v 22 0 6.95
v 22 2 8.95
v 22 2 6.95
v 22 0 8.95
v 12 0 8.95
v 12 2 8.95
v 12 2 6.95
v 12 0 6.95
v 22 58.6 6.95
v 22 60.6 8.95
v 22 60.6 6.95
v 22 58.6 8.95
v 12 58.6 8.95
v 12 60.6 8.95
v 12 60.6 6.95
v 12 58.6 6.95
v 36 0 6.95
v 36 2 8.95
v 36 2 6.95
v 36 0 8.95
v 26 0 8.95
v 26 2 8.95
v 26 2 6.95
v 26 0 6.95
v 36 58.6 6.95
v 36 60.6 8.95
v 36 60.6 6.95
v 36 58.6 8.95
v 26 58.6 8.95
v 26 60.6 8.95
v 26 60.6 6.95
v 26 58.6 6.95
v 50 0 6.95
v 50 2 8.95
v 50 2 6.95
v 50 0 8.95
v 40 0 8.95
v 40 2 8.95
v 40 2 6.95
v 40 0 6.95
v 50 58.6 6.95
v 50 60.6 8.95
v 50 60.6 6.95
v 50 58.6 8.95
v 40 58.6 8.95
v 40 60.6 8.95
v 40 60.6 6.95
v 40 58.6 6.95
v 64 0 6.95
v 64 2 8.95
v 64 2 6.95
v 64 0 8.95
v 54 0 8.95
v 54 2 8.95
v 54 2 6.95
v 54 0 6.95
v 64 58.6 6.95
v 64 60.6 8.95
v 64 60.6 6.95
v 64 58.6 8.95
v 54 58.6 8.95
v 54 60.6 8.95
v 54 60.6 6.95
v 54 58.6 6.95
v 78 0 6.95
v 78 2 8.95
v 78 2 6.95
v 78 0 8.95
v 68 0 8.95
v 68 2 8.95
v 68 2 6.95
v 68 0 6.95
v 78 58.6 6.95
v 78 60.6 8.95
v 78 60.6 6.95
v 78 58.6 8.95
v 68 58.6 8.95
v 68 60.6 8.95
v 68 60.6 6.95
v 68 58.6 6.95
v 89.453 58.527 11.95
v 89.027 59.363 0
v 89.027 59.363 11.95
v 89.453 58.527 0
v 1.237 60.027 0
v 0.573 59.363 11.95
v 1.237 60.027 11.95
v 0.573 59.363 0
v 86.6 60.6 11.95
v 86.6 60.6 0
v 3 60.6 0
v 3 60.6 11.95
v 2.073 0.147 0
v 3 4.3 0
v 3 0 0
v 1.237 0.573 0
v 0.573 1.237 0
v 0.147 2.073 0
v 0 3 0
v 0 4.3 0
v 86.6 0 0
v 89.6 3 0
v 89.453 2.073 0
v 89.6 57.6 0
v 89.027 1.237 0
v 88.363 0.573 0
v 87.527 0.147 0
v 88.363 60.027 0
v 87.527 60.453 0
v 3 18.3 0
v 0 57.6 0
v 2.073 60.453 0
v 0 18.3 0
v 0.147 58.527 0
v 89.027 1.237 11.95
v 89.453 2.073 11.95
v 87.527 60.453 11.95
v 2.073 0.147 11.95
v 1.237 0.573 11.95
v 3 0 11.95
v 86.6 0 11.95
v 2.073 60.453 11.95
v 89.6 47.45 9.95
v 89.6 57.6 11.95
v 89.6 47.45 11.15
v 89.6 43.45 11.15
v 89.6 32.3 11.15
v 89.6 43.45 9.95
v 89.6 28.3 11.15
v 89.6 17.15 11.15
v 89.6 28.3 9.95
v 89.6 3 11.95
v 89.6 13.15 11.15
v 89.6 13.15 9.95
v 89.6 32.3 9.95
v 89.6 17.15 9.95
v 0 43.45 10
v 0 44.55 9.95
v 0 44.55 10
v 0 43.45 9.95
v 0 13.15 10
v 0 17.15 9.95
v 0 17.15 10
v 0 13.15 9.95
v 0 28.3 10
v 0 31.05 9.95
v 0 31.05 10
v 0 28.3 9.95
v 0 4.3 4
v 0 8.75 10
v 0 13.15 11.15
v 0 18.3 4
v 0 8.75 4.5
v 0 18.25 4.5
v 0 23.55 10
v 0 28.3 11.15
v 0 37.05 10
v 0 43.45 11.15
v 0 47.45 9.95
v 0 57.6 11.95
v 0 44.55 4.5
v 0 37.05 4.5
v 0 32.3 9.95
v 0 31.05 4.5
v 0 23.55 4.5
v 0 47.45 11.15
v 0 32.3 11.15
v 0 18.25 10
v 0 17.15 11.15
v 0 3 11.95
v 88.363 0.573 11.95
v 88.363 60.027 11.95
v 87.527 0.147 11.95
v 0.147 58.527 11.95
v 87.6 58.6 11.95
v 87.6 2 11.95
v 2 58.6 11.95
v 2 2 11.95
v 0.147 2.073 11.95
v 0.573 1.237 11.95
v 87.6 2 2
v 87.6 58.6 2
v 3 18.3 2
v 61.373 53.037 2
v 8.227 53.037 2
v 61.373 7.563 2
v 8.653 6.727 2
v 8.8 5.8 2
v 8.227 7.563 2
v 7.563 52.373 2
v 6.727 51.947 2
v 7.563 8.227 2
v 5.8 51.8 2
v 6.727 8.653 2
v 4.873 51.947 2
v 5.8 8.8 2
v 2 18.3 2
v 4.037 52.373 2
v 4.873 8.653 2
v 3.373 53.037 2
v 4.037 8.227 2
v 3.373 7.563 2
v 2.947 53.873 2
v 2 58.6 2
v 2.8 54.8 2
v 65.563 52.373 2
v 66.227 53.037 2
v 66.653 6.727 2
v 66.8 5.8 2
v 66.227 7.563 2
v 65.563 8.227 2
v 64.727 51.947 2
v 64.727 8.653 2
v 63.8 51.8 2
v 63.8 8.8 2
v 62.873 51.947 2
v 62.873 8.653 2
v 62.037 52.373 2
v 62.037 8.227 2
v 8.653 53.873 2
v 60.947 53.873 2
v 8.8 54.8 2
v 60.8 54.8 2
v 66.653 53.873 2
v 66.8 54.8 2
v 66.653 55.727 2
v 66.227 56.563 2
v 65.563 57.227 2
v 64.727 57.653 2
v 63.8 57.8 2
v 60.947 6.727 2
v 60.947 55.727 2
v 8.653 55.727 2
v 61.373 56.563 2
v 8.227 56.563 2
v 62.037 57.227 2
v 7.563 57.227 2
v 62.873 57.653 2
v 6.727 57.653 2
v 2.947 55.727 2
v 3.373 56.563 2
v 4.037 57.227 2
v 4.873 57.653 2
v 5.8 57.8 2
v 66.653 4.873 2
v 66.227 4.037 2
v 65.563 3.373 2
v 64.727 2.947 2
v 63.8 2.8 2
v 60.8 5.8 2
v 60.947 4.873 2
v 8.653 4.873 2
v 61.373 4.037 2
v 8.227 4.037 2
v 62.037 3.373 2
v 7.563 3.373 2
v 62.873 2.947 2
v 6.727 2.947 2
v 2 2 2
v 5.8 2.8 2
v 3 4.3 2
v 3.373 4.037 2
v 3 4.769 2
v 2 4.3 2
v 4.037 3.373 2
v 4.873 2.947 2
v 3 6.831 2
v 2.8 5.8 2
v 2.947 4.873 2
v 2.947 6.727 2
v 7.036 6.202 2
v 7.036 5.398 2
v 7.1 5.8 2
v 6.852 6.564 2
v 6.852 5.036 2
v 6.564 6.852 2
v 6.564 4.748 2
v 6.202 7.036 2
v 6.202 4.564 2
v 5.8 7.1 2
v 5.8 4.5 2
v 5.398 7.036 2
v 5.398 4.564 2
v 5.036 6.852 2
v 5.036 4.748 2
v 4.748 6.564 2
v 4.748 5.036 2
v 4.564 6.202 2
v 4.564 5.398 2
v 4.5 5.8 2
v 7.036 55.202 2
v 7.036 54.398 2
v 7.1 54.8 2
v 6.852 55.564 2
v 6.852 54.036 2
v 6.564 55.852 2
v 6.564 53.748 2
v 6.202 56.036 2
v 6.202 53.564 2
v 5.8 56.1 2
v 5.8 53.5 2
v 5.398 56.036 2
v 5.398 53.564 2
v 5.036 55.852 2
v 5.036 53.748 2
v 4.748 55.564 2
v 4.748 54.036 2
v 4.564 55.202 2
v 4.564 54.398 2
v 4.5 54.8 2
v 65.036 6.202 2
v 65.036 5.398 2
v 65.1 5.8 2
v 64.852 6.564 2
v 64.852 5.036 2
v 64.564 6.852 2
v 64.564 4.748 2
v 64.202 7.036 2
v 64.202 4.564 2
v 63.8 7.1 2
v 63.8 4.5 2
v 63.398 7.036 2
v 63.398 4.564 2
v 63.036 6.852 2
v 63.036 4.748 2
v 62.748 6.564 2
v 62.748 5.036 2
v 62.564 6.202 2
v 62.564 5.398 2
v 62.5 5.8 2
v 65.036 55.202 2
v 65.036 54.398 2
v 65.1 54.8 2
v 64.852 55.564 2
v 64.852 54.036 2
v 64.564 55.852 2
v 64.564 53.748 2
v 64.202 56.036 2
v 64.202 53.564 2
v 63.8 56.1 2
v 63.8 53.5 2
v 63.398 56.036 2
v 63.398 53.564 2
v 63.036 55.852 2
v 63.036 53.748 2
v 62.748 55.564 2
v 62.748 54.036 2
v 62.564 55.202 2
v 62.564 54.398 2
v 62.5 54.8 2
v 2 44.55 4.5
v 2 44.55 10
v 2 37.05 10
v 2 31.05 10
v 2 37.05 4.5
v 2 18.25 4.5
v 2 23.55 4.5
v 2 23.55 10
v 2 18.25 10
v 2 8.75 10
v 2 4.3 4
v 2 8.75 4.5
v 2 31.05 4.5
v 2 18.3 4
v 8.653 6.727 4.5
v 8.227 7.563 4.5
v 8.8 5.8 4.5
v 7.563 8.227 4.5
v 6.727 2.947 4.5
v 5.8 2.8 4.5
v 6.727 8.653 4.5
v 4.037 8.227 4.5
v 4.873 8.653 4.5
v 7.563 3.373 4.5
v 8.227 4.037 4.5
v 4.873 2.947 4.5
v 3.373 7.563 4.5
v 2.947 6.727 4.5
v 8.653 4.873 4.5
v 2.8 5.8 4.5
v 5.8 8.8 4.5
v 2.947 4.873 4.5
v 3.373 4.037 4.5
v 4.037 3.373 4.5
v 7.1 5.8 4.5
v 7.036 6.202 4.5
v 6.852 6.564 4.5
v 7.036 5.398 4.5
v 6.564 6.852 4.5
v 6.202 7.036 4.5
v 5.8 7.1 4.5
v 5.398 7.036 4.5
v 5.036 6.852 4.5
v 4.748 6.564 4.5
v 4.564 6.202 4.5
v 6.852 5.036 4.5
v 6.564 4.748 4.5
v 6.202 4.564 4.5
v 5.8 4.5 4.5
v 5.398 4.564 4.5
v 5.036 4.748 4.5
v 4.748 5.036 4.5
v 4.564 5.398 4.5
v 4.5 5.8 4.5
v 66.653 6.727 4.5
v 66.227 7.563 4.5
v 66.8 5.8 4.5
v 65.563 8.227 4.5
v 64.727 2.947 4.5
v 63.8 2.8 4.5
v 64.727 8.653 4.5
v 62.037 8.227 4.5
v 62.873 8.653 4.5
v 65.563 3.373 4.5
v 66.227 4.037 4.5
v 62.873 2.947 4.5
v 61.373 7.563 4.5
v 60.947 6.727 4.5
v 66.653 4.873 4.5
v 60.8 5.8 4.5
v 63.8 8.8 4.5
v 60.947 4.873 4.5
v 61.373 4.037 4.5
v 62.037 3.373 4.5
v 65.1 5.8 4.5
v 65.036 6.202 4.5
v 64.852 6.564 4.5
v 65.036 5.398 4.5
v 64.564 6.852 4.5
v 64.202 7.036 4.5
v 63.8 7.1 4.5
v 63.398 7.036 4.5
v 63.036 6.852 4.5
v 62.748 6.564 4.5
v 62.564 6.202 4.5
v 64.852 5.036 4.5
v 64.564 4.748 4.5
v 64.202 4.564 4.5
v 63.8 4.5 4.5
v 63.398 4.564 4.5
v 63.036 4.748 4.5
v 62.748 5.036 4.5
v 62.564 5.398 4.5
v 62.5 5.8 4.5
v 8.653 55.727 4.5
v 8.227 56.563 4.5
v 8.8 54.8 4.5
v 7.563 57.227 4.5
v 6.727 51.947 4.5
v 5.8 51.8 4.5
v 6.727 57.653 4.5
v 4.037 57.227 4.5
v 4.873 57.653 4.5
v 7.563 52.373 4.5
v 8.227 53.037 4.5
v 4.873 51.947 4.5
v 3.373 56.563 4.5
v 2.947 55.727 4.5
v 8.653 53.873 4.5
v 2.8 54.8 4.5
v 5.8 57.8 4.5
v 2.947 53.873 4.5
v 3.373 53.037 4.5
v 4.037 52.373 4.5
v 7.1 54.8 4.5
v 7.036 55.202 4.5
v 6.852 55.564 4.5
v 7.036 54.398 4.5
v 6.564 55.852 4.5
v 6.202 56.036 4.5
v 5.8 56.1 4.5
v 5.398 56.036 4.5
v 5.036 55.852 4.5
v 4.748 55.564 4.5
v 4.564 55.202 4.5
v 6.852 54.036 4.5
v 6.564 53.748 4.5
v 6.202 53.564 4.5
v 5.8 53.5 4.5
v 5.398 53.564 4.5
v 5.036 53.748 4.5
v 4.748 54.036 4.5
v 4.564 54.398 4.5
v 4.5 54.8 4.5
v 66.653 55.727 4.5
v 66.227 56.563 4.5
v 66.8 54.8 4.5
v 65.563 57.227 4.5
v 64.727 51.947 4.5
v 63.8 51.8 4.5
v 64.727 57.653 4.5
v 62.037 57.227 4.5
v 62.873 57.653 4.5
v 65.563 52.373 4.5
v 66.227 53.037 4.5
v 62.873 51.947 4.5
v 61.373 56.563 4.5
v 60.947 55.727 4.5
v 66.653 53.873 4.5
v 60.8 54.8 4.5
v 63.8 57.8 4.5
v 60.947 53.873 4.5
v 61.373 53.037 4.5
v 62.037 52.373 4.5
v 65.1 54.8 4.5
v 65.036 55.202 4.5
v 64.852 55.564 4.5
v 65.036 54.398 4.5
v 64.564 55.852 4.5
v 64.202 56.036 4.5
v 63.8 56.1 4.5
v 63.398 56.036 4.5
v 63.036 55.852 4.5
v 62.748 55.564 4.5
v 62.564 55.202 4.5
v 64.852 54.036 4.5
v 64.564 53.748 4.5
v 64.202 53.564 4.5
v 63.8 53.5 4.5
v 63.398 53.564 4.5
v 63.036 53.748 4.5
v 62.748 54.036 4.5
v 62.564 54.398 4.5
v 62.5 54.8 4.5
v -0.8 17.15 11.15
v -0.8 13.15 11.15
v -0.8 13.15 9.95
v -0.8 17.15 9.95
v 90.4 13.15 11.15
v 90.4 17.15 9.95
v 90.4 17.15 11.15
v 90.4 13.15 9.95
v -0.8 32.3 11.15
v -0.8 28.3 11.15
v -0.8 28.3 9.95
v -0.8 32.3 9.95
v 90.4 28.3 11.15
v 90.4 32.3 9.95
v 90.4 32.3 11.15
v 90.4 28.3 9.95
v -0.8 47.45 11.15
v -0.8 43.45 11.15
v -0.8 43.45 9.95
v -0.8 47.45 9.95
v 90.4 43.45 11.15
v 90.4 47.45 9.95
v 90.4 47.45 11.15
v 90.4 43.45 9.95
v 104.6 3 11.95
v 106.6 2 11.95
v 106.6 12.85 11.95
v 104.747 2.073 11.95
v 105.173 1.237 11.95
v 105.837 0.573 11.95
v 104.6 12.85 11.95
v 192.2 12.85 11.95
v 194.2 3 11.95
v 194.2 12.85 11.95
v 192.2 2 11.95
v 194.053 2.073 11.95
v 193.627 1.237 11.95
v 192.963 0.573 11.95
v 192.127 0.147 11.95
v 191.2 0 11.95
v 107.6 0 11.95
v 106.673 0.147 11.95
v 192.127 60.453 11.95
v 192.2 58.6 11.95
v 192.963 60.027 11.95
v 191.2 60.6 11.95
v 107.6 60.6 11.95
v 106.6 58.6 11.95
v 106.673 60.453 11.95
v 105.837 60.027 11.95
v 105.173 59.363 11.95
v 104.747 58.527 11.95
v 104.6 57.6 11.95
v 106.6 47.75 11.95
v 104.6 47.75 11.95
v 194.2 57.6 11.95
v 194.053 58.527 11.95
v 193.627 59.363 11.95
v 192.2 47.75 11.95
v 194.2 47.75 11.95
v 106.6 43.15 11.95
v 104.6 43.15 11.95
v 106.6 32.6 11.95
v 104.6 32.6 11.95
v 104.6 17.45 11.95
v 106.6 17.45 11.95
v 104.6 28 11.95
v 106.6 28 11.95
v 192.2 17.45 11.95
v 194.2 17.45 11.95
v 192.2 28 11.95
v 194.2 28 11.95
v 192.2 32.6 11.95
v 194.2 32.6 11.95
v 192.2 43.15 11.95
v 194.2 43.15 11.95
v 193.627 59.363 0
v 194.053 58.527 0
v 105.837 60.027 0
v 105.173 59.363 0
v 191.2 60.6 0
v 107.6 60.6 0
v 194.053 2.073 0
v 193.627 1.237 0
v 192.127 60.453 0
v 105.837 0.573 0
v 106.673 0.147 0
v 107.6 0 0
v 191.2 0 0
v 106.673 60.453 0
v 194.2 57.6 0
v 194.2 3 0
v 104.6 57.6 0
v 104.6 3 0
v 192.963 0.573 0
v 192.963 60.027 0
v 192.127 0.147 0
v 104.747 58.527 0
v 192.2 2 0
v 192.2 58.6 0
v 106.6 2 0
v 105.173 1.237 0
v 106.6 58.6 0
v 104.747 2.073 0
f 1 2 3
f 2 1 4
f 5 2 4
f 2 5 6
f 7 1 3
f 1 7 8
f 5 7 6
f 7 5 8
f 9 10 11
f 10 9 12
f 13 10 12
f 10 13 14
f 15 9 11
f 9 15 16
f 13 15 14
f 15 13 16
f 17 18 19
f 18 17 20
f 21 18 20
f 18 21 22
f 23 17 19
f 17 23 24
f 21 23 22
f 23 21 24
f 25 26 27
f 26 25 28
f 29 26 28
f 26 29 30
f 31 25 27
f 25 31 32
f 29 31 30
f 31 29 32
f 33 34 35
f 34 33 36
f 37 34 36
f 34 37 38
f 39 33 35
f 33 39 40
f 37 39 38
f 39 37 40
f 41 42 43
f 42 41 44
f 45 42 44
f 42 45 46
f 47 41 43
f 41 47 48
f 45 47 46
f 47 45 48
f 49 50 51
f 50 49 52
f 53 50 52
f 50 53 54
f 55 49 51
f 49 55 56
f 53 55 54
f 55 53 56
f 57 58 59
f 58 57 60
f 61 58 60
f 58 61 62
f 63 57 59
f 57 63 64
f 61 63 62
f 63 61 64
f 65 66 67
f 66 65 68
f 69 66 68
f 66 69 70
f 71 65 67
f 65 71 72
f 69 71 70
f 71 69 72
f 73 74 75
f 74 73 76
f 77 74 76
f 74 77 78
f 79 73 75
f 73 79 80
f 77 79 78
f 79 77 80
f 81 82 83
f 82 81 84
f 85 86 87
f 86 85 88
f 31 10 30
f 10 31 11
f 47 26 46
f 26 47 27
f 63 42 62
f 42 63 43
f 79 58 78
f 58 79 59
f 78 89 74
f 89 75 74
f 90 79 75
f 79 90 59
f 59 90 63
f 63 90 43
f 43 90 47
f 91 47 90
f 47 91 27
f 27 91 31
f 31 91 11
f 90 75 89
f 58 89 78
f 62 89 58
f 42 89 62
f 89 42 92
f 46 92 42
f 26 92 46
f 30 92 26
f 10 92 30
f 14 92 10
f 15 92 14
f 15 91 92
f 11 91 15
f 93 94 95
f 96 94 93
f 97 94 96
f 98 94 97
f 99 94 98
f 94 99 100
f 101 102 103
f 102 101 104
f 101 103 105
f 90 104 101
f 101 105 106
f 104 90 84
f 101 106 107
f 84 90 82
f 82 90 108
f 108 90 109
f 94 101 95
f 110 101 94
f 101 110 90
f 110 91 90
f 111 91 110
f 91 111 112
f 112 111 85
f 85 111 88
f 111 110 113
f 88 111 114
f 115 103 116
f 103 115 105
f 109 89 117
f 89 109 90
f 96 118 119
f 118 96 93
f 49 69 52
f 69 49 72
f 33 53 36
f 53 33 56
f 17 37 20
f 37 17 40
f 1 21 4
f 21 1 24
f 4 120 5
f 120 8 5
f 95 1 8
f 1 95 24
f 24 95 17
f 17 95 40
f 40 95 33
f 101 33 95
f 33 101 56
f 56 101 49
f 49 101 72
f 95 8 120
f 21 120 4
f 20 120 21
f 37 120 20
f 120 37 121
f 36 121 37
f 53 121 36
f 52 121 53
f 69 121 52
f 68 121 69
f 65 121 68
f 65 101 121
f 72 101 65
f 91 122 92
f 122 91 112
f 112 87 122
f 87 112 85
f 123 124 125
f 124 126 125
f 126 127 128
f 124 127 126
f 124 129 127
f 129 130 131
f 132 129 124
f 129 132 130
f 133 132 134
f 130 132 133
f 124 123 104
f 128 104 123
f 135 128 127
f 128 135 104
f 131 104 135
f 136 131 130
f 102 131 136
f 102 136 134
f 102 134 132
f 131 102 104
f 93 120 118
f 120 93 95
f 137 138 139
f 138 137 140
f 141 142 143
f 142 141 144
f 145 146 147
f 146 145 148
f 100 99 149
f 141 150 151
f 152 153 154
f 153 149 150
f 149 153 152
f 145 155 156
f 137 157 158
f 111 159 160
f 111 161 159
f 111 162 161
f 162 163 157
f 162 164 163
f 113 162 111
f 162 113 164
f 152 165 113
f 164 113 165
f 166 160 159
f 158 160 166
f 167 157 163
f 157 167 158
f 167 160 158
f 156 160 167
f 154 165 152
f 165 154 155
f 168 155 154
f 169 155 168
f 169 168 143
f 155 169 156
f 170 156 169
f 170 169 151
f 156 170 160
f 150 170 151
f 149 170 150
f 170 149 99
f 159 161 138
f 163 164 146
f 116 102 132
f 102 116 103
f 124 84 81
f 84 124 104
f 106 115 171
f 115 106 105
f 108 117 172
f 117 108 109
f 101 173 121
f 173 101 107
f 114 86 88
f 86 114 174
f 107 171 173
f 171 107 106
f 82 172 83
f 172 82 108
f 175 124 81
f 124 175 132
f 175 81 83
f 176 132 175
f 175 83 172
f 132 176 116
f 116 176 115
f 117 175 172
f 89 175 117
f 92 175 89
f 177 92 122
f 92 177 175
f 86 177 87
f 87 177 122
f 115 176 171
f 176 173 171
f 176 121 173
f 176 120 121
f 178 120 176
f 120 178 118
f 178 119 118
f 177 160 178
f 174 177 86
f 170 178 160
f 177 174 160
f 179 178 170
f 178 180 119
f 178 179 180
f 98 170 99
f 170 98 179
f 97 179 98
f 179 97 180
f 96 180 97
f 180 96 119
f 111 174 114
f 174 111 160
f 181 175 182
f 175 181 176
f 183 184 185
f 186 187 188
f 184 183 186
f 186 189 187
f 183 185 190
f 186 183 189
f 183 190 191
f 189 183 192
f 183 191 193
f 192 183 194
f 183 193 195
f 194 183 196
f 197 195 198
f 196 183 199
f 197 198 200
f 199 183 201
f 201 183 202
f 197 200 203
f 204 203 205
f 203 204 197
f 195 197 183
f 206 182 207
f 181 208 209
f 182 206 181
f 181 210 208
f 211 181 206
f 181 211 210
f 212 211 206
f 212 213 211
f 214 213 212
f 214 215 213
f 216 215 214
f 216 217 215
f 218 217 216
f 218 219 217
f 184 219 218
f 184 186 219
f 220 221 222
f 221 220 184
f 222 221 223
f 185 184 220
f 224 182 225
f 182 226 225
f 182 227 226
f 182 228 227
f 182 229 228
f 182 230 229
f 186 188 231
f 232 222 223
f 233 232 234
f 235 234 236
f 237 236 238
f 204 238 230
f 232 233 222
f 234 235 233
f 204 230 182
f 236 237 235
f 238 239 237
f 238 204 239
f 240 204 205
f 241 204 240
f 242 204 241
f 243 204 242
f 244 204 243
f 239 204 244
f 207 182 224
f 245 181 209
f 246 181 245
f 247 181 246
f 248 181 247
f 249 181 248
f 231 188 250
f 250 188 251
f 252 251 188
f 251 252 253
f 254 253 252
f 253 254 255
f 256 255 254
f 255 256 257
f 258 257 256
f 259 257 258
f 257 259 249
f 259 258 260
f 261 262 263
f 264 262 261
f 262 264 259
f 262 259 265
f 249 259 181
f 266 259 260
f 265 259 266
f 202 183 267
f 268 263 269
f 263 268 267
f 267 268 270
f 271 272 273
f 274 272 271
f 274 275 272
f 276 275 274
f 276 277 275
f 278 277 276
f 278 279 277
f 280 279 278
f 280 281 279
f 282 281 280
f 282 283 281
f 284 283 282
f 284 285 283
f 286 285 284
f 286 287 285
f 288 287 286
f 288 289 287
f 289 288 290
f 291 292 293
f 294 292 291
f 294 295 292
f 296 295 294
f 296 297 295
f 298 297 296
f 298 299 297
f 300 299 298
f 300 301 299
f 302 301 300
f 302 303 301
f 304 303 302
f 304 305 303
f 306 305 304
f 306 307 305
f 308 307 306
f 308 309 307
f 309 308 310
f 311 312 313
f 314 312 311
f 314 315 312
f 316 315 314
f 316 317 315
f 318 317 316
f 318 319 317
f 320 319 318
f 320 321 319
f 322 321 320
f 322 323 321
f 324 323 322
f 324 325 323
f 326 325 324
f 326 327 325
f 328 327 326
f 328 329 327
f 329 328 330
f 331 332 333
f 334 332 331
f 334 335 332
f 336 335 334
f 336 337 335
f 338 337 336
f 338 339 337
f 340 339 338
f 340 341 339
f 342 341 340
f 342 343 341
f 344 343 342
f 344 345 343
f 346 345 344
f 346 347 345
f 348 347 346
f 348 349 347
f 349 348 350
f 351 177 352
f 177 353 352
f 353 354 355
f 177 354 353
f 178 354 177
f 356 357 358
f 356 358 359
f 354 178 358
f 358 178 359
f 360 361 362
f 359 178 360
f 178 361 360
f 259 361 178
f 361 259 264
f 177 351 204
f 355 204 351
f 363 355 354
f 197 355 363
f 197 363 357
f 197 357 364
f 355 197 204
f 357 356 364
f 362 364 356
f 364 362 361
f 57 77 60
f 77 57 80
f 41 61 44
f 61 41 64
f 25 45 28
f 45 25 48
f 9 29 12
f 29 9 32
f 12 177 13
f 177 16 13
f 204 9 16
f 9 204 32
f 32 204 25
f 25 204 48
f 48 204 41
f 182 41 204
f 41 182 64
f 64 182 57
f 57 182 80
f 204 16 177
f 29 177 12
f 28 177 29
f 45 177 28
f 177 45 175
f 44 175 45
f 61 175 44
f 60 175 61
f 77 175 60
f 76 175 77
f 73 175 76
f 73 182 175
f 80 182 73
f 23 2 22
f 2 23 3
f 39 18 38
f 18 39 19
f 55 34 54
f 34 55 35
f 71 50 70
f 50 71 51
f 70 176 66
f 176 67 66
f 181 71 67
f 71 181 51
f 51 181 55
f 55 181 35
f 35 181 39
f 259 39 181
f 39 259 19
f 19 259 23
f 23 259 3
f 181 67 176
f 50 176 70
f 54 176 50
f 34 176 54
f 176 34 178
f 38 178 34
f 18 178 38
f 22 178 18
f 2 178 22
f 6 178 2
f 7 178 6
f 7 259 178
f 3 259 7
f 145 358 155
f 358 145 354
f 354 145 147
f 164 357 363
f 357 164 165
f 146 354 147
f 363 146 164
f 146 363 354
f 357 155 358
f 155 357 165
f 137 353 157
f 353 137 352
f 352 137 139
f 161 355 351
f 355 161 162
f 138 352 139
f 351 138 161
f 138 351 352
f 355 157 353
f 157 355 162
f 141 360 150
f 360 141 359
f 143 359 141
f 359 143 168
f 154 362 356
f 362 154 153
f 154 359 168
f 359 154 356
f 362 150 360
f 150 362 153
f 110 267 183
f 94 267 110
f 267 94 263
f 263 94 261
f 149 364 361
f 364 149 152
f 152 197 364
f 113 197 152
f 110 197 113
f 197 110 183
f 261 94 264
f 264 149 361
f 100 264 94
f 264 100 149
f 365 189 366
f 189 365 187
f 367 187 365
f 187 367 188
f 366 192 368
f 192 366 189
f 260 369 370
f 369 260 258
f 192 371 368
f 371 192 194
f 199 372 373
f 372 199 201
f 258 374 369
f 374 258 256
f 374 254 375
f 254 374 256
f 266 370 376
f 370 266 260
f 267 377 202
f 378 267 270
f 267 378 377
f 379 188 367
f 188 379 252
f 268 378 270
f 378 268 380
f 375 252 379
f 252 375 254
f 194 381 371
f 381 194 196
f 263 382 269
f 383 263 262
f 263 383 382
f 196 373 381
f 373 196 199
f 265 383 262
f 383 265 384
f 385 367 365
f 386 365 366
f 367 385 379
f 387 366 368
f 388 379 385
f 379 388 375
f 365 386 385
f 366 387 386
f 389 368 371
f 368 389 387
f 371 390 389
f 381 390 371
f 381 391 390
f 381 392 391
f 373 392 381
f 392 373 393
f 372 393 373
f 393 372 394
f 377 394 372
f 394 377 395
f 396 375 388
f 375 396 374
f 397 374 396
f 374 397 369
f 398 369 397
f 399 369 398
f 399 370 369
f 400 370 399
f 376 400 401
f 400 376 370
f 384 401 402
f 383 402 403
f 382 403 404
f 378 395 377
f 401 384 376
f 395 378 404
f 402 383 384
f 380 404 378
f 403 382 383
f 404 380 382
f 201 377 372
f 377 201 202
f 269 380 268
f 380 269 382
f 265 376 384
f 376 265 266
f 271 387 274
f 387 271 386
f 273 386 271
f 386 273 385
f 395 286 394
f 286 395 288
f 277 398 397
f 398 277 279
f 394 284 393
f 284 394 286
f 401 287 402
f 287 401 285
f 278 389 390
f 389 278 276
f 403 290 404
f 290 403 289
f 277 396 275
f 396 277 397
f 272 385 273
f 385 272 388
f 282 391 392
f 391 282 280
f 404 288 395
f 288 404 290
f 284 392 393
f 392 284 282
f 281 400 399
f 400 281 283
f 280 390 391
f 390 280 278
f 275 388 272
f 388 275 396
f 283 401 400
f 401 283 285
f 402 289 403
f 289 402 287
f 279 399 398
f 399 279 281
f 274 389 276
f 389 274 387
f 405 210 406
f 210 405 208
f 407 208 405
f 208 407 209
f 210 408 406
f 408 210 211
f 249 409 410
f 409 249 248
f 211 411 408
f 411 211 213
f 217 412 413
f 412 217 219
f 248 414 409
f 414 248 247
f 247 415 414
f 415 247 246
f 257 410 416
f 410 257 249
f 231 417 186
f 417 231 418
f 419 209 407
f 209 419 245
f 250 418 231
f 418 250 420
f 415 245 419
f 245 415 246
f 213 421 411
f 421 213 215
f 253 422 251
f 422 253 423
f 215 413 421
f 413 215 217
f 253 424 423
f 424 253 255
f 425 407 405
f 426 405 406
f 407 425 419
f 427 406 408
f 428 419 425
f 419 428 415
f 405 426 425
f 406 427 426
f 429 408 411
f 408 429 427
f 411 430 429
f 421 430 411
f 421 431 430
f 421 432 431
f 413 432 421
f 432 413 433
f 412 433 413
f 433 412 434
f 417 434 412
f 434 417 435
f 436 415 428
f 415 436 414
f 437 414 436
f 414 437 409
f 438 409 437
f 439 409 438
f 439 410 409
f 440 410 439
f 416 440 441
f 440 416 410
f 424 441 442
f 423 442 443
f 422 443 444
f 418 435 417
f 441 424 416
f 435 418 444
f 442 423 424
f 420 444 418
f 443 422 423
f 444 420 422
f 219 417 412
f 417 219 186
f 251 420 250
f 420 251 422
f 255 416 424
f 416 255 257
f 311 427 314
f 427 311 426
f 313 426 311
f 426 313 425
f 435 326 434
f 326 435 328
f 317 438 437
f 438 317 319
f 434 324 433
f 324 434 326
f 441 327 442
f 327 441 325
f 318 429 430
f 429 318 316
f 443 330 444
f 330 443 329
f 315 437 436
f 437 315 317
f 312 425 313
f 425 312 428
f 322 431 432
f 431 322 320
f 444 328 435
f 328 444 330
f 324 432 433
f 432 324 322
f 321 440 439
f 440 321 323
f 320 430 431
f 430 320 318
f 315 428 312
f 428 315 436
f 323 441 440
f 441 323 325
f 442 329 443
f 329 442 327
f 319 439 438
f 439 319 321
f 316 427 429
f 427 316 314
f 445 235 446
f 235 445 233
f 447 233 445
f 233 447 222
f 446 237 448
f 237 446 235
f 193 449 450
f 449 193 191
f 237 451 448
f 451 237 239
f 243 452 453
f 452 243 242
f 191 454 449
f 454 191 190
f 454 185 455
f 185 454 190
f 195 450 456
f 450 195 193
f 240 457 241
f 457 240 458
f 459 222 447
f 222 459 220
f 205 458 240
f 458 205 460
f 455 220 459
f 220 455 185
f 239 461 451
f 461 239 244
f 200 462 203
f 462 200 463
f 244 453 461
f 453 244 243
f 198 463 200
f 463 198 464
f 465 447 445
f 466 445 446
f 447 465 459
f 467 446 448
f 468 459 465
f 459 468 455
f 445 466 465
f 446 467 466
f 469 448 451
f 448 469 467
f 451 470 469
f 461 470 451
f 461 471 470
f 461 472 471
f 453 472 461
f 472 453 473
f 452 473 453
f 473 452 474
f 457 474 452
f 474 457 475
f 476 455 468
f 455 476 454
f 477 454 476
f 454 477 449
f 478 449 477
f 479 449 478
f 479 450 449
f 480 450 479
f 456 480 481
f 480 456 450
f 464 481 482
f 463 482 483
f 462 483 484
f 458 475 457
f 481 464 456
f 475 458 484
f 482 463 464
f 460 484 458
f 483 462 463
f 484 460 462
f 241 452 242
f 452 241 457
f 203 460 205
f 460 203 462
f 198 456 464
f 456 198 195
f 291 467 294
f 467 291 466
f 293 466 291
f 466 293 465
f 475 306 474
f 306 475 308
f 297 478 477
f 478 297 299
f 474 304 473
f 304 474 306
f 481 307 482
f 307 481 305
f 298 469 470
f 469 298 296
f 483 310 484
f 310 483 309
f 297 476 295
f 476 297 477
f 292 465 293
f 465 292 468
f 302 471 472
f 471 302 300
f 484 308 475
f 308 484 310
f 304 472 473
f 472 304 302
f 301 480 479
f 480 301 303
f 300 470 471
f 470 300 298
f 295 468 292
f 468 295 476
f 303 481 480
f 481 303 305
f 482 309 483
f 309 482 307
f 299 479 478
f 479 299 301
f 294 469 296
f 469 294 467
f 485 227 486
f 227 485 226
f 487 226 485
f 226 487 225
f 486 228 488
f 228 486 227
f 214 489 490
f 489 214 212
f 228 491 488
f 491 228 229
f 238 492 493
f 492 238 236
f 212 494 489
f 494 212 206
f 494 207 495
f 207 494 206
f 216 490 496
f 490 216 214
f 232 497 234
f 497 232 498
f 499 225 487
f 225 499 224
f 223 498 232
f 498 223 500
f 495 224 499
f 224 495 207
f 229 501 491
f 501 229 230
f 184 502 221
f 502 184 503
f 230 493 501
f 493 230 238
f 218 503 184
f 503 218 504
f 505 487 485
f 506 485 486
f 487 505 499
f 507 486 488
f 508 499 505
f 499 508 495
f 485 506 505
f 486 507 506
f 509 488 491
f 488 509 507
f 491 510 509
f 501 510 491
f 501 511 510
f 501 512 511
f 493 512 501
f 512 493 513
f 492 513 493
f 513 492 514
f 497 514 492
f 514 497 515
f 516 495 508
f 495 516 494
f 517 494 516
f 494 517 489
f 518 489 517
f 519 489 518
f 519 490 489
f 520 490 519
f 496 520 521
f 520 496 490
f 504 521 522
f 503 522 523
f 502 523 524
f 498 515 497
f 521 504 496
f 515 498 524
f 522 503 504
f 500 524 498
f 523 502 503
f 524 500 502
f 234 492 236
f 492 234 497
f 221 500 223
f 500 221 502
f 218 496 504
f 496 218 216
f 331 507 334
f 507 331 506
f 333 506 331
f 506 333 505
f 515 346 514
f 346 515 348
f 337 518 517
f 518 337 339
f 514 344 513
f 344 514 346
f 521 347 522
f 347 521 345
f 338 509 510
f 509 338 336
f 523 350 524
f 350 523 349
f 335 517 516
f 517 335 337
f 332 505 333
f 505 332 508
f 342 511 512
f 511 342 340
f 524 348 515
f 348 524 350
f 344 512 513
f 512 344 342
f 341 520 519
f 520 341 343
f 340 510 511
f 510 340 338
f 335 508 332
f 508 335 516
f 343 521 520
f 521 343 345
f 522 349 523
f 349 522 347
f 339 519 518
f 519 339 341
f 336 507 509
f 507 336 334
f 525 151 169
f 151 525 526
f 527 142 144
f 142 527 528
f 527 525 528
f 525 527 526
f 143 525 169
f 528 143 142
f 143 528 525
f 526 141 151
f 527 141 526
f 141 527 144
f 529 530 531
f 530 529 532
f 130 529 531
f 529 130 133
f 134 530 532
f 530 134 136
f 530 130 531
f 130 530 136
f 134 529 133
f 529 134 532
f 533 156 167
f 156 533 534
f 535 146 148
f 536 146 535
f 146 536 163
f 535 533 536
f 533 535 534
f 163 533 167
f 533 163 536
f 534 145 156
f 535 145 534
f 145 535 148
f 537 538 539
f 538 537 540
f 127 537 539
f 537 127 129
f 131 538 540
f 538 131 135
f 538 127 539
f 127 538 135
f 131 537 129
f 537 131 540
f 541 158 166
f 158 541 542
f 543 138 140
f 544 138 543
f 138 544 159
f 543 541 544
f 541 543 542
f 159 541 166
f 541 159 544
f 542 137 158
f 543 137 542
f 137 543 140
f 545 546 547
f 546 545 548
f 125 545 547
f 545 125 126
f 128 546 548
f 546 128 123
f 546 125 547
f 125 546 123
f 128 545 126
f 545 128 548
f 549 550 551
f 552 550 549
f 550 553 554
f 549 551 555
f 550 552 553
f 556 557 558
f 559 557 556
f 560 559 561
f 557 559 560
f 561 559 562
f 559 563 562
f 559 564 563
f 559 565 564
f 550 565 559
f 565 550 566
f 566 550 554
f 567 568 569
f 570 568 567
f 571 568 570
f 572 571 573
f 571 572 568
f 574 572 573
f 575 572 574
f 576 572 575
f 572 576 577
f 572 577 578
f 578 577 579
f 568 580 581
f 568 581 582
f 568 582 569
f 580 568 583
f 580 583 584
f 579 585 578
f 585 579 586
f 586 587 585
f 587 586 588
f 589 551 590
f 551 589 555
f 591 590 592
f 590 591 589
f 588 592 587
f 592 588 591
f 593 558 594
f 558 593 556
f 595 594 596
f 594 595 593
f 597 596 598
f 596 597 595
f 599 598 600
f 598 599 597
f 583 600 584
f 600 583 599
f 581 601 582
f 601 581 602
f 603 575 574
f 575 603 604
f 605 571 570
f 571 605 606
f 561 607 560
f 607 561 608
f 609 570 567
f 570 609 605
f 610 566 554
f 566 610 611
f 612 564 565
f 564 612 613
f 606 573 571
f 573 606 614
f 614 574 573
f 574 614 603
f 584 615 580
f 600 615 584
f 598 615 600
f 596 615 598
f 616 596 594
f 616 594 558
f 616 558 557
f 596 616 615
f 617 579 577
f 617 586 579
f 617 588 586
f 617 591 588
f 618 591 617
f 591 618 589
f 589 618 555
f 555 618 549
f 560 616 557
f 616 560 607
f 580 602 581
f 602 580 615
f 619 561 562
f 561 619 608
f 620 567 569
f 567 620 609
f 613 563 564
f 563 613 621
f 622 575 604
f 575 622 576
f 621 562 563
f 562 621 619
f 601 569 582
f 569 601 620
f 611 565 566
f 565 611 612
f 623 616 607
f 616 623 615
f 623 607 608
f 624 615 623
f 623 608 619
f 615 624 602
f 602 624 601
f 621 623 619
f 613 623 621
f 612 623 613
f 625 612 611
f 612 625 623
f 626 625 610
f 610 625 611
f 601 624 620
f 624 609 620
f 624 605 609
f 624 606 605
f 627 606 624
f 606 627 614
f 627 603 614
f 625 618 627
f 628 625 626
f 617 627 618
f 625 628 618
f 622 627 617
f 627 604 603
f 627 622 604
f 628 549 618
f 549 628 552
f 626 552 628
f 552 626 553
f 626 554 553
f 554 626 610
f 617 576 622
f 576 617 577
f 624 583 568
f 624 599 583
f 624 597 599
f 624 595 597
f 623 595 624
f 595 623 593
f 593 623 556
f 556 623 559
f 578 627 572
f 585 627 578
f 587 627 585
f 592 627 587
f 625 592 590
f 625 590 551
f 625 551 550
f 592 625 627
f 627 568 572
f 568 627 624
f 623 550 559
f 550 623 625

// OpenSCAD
// Wireless Display Dongle — 4K-kotelo (Pi 4 Model B)
// Mitat perustuvat Raspberry Pi 4 Model B:n virallisiin mittoihin
//
// Tulosta: PETG (lämmönkesto), 0.2mm layer height
// Kotelo on kaksiosainen: pohja + kansi snap-fit-lukituksella

/* [Asetukset] */
wall = 2.0;       // seinämän paksuus - paksumpi kuin lite (lämpö)
tol = 0.3;        // toleranssi

/* [Pi 4 Model B mitat] */
pcb_w = 85.0;     // leveys
pcb_d = 56.0;     // syvyys
pcb_h = 1.4;      // piirilevyn paksuus
comp_h = 5.0;     // komponenttien korkeus yläpuolella
bottom_h = 2.5;   // komponenttien korkeus alapuolella (SD-kortin lukija)

/* [Liittimet - Pi 4:n vasemmasta reunasta mitattuna] */
// Micro-HDMI 0: vasen pääty (USB-C:n puoli)
hdmi0_offset = 25.0;
hdmi0_w = 7.5;
hdmi0_h = 3.5;

// Micro-HDMI 1:
hdmi1_offset = 38.5;
hdmi1_w = 7.5;
hdmi1_h = 3.5;

// USB-C (virta): vasen pääty
usbc_offset = 11.2;
usbc_w = 9.5;
usbc_h = 3.5;

// USB-A portit: oikea pääty (ei aukkoa - ei tarvita)

// Ethernet: oikea pääty (ei aukkoa - ei tarvita)

// microSD: vasen pääty, piirilevyn alapuolella
sd_offset = 2.0;   // reunasta
sd_w = 14.0;
sd_h = 2.0;

// GPIO: pitkä sivu, yläpuoli (ei aukkoa)

/* [Jäähdytys] */
// Pi 4 tarvitsee tehokkaampaa jäähdytystä
heatsink_h = 5.0;
fan_diameter = 25.0;  // valinnainen 25mm tuuletin

/* [Lasketut mitat] */
inner_w = pcb_w + tol * 2;
inner_d = pcb_d + tol * 2;
inner_h = bottom_h + pcb_h + comp_h + heatsink_h + 2.0;

outer_w = inner_w + wall * 2;
outer_d = inner_d + wall * 2;
outer_h = inner_h + wall * 2;

snap_w = 4.0;
snap_h = 1.2;
snap_depth = 0.8;

module case_bottom() {
    difference() {
        rounded_box(outer_w, outer_d, outer_h / 2 + wall, 3);

        // Sisätila
        translate([wall, wall, wall])
            cube([inner_w, inner_d, outer_h]);

        // Micro-HDMI 0 -aukko
        translate([-1, wall + tol + hdmi0_offset - hdmi0_w/2, wall + bottom_h])
            cube([wall + 2, hdmi0_w, hdmi0_h + 2]);

        // Micro-HDMI 1 -aukko
        translate([-1, wall + tol + hdmi1_offset - hdmi1_w/2, wall + bottom_h])
            cube([wall + 2, hdmi1_w, hdmi1_h + 2]);

        // USB-C virta-aukko
        translate([-1, wall + tol + usbc_offset - usbc_w/2, wall + bottom_h])
            cube([wall + 2, usbc_w, usbc_h + 2]);

        // microSD-aukko (alapuoli, vasen pääty)
        translate([-1, wall + tol + sd_offset, -1])
            cube([wall + 2, sd_w, wall + sd_h + 1]);

        // Sivujen tuuletusaukot
        for (i = [0:4]) {
            translate([wall + 10 + i * 14, -1, outer_h / 2 - 3])
                cube([10, wall + 2, 2]);
            translate([wall + 10 + i * 14, outer_d - wall - 1, outer_h / 2 - 3])
                cube([10, wall + 2, 2]);
        }
    }

    // Piirilevyn tuet (Pi 4:n kiinnitysreiät)
    // Reiät: 3.5mm reunasta, 58mm ja 49mm välit
    hole_positions = [
        [3.5, 3.5],
        [3.5 + 58, 3.5],
        [3.5, 3.5 + 49],
        [3.5 + 58, 3.5 + 49]
    ];
    for (pos = hole_positions)
        translate([wall + tol + pos[0], wall + tol + pos[1], wall])
            difference() {
                cylinder(h = bottom_h, r = 3.0, $fn = 20);
                cylinder(h = bottom_h + 1, r = 1.3, $fn = 20);  // M2.5 ruuvi
            }

    // Snap-fit korvakkeet
    for (y = [outer_d * 0.25, outer_d * 0.5, outer_d * 0.75]) {
        translate([-snap_depth, y - snap_w/2, outer_h/2])
            cube([snap_depth, snap_w, snap_h]);
        translate([outer_w, y - snap_w/2, outer_h/2])
            cube([snap_depth, snap_w, snap_h]);
    }
}

module case_top() {
    difference() {
        rounded_box(outer_w, outer_d, outer_h / 2 + wall, 3);

        // Sisätila
        translate([wall, wall, -1])
            cube([inner_w, inner_d, outer_h]);

        // Tuuletusaukot yläpinnalla (ristikko)
        for (i = [0:3])
            for (j = [0:2])
                translate([wall + 12 + i * 18, wall + 10 + j * 16, outer_h/2])
                    cube([12, 10, wall + 2]);

        // Valinnainen tuuletinaukko (25mm, SoC:n yläpuolella)
        translate([wall + tol + 30, wall + tol + 28, outer_h/2])
            cylinder(h = wall + 2, d = fan_diameter + 1, $fn = 40);

        // Snap-fit urat
        for (y = [outer_d * 0.25, outer_d * 0.5, outer_d * 0.75]) {
            translate([-1, y - snap_w/2 - tol, -snap_h - tol])
                cube([wall + 1 + snap_depth + tol, snap_w + tol*2, snap_h + tol]);
            translate([outer_w - wall - snap_depth - tol, y - snap_w/2 - tol, -snap_h - tol])
                cube([wall + 1 + snap_depth + tol, snap_w + tol*2, snap_h + tol]);
        }
    }
}

module rounded_box(w, d, h, r) {
    hull() {
        for (x = [r, w - r])
            for (y = [r, d - r])
                translate([x, y, 0])
                    cylinder(h = h, r = r, $fn = 20);
    }
}

// --- Renderöinti ---
// Pohja
case_bottom();

// Kansi (siirretty viereen)
translate([outer_w + 15, 0, outer_h / 2 + wall])
    mirror([0, 0, 1])
        case_top();
